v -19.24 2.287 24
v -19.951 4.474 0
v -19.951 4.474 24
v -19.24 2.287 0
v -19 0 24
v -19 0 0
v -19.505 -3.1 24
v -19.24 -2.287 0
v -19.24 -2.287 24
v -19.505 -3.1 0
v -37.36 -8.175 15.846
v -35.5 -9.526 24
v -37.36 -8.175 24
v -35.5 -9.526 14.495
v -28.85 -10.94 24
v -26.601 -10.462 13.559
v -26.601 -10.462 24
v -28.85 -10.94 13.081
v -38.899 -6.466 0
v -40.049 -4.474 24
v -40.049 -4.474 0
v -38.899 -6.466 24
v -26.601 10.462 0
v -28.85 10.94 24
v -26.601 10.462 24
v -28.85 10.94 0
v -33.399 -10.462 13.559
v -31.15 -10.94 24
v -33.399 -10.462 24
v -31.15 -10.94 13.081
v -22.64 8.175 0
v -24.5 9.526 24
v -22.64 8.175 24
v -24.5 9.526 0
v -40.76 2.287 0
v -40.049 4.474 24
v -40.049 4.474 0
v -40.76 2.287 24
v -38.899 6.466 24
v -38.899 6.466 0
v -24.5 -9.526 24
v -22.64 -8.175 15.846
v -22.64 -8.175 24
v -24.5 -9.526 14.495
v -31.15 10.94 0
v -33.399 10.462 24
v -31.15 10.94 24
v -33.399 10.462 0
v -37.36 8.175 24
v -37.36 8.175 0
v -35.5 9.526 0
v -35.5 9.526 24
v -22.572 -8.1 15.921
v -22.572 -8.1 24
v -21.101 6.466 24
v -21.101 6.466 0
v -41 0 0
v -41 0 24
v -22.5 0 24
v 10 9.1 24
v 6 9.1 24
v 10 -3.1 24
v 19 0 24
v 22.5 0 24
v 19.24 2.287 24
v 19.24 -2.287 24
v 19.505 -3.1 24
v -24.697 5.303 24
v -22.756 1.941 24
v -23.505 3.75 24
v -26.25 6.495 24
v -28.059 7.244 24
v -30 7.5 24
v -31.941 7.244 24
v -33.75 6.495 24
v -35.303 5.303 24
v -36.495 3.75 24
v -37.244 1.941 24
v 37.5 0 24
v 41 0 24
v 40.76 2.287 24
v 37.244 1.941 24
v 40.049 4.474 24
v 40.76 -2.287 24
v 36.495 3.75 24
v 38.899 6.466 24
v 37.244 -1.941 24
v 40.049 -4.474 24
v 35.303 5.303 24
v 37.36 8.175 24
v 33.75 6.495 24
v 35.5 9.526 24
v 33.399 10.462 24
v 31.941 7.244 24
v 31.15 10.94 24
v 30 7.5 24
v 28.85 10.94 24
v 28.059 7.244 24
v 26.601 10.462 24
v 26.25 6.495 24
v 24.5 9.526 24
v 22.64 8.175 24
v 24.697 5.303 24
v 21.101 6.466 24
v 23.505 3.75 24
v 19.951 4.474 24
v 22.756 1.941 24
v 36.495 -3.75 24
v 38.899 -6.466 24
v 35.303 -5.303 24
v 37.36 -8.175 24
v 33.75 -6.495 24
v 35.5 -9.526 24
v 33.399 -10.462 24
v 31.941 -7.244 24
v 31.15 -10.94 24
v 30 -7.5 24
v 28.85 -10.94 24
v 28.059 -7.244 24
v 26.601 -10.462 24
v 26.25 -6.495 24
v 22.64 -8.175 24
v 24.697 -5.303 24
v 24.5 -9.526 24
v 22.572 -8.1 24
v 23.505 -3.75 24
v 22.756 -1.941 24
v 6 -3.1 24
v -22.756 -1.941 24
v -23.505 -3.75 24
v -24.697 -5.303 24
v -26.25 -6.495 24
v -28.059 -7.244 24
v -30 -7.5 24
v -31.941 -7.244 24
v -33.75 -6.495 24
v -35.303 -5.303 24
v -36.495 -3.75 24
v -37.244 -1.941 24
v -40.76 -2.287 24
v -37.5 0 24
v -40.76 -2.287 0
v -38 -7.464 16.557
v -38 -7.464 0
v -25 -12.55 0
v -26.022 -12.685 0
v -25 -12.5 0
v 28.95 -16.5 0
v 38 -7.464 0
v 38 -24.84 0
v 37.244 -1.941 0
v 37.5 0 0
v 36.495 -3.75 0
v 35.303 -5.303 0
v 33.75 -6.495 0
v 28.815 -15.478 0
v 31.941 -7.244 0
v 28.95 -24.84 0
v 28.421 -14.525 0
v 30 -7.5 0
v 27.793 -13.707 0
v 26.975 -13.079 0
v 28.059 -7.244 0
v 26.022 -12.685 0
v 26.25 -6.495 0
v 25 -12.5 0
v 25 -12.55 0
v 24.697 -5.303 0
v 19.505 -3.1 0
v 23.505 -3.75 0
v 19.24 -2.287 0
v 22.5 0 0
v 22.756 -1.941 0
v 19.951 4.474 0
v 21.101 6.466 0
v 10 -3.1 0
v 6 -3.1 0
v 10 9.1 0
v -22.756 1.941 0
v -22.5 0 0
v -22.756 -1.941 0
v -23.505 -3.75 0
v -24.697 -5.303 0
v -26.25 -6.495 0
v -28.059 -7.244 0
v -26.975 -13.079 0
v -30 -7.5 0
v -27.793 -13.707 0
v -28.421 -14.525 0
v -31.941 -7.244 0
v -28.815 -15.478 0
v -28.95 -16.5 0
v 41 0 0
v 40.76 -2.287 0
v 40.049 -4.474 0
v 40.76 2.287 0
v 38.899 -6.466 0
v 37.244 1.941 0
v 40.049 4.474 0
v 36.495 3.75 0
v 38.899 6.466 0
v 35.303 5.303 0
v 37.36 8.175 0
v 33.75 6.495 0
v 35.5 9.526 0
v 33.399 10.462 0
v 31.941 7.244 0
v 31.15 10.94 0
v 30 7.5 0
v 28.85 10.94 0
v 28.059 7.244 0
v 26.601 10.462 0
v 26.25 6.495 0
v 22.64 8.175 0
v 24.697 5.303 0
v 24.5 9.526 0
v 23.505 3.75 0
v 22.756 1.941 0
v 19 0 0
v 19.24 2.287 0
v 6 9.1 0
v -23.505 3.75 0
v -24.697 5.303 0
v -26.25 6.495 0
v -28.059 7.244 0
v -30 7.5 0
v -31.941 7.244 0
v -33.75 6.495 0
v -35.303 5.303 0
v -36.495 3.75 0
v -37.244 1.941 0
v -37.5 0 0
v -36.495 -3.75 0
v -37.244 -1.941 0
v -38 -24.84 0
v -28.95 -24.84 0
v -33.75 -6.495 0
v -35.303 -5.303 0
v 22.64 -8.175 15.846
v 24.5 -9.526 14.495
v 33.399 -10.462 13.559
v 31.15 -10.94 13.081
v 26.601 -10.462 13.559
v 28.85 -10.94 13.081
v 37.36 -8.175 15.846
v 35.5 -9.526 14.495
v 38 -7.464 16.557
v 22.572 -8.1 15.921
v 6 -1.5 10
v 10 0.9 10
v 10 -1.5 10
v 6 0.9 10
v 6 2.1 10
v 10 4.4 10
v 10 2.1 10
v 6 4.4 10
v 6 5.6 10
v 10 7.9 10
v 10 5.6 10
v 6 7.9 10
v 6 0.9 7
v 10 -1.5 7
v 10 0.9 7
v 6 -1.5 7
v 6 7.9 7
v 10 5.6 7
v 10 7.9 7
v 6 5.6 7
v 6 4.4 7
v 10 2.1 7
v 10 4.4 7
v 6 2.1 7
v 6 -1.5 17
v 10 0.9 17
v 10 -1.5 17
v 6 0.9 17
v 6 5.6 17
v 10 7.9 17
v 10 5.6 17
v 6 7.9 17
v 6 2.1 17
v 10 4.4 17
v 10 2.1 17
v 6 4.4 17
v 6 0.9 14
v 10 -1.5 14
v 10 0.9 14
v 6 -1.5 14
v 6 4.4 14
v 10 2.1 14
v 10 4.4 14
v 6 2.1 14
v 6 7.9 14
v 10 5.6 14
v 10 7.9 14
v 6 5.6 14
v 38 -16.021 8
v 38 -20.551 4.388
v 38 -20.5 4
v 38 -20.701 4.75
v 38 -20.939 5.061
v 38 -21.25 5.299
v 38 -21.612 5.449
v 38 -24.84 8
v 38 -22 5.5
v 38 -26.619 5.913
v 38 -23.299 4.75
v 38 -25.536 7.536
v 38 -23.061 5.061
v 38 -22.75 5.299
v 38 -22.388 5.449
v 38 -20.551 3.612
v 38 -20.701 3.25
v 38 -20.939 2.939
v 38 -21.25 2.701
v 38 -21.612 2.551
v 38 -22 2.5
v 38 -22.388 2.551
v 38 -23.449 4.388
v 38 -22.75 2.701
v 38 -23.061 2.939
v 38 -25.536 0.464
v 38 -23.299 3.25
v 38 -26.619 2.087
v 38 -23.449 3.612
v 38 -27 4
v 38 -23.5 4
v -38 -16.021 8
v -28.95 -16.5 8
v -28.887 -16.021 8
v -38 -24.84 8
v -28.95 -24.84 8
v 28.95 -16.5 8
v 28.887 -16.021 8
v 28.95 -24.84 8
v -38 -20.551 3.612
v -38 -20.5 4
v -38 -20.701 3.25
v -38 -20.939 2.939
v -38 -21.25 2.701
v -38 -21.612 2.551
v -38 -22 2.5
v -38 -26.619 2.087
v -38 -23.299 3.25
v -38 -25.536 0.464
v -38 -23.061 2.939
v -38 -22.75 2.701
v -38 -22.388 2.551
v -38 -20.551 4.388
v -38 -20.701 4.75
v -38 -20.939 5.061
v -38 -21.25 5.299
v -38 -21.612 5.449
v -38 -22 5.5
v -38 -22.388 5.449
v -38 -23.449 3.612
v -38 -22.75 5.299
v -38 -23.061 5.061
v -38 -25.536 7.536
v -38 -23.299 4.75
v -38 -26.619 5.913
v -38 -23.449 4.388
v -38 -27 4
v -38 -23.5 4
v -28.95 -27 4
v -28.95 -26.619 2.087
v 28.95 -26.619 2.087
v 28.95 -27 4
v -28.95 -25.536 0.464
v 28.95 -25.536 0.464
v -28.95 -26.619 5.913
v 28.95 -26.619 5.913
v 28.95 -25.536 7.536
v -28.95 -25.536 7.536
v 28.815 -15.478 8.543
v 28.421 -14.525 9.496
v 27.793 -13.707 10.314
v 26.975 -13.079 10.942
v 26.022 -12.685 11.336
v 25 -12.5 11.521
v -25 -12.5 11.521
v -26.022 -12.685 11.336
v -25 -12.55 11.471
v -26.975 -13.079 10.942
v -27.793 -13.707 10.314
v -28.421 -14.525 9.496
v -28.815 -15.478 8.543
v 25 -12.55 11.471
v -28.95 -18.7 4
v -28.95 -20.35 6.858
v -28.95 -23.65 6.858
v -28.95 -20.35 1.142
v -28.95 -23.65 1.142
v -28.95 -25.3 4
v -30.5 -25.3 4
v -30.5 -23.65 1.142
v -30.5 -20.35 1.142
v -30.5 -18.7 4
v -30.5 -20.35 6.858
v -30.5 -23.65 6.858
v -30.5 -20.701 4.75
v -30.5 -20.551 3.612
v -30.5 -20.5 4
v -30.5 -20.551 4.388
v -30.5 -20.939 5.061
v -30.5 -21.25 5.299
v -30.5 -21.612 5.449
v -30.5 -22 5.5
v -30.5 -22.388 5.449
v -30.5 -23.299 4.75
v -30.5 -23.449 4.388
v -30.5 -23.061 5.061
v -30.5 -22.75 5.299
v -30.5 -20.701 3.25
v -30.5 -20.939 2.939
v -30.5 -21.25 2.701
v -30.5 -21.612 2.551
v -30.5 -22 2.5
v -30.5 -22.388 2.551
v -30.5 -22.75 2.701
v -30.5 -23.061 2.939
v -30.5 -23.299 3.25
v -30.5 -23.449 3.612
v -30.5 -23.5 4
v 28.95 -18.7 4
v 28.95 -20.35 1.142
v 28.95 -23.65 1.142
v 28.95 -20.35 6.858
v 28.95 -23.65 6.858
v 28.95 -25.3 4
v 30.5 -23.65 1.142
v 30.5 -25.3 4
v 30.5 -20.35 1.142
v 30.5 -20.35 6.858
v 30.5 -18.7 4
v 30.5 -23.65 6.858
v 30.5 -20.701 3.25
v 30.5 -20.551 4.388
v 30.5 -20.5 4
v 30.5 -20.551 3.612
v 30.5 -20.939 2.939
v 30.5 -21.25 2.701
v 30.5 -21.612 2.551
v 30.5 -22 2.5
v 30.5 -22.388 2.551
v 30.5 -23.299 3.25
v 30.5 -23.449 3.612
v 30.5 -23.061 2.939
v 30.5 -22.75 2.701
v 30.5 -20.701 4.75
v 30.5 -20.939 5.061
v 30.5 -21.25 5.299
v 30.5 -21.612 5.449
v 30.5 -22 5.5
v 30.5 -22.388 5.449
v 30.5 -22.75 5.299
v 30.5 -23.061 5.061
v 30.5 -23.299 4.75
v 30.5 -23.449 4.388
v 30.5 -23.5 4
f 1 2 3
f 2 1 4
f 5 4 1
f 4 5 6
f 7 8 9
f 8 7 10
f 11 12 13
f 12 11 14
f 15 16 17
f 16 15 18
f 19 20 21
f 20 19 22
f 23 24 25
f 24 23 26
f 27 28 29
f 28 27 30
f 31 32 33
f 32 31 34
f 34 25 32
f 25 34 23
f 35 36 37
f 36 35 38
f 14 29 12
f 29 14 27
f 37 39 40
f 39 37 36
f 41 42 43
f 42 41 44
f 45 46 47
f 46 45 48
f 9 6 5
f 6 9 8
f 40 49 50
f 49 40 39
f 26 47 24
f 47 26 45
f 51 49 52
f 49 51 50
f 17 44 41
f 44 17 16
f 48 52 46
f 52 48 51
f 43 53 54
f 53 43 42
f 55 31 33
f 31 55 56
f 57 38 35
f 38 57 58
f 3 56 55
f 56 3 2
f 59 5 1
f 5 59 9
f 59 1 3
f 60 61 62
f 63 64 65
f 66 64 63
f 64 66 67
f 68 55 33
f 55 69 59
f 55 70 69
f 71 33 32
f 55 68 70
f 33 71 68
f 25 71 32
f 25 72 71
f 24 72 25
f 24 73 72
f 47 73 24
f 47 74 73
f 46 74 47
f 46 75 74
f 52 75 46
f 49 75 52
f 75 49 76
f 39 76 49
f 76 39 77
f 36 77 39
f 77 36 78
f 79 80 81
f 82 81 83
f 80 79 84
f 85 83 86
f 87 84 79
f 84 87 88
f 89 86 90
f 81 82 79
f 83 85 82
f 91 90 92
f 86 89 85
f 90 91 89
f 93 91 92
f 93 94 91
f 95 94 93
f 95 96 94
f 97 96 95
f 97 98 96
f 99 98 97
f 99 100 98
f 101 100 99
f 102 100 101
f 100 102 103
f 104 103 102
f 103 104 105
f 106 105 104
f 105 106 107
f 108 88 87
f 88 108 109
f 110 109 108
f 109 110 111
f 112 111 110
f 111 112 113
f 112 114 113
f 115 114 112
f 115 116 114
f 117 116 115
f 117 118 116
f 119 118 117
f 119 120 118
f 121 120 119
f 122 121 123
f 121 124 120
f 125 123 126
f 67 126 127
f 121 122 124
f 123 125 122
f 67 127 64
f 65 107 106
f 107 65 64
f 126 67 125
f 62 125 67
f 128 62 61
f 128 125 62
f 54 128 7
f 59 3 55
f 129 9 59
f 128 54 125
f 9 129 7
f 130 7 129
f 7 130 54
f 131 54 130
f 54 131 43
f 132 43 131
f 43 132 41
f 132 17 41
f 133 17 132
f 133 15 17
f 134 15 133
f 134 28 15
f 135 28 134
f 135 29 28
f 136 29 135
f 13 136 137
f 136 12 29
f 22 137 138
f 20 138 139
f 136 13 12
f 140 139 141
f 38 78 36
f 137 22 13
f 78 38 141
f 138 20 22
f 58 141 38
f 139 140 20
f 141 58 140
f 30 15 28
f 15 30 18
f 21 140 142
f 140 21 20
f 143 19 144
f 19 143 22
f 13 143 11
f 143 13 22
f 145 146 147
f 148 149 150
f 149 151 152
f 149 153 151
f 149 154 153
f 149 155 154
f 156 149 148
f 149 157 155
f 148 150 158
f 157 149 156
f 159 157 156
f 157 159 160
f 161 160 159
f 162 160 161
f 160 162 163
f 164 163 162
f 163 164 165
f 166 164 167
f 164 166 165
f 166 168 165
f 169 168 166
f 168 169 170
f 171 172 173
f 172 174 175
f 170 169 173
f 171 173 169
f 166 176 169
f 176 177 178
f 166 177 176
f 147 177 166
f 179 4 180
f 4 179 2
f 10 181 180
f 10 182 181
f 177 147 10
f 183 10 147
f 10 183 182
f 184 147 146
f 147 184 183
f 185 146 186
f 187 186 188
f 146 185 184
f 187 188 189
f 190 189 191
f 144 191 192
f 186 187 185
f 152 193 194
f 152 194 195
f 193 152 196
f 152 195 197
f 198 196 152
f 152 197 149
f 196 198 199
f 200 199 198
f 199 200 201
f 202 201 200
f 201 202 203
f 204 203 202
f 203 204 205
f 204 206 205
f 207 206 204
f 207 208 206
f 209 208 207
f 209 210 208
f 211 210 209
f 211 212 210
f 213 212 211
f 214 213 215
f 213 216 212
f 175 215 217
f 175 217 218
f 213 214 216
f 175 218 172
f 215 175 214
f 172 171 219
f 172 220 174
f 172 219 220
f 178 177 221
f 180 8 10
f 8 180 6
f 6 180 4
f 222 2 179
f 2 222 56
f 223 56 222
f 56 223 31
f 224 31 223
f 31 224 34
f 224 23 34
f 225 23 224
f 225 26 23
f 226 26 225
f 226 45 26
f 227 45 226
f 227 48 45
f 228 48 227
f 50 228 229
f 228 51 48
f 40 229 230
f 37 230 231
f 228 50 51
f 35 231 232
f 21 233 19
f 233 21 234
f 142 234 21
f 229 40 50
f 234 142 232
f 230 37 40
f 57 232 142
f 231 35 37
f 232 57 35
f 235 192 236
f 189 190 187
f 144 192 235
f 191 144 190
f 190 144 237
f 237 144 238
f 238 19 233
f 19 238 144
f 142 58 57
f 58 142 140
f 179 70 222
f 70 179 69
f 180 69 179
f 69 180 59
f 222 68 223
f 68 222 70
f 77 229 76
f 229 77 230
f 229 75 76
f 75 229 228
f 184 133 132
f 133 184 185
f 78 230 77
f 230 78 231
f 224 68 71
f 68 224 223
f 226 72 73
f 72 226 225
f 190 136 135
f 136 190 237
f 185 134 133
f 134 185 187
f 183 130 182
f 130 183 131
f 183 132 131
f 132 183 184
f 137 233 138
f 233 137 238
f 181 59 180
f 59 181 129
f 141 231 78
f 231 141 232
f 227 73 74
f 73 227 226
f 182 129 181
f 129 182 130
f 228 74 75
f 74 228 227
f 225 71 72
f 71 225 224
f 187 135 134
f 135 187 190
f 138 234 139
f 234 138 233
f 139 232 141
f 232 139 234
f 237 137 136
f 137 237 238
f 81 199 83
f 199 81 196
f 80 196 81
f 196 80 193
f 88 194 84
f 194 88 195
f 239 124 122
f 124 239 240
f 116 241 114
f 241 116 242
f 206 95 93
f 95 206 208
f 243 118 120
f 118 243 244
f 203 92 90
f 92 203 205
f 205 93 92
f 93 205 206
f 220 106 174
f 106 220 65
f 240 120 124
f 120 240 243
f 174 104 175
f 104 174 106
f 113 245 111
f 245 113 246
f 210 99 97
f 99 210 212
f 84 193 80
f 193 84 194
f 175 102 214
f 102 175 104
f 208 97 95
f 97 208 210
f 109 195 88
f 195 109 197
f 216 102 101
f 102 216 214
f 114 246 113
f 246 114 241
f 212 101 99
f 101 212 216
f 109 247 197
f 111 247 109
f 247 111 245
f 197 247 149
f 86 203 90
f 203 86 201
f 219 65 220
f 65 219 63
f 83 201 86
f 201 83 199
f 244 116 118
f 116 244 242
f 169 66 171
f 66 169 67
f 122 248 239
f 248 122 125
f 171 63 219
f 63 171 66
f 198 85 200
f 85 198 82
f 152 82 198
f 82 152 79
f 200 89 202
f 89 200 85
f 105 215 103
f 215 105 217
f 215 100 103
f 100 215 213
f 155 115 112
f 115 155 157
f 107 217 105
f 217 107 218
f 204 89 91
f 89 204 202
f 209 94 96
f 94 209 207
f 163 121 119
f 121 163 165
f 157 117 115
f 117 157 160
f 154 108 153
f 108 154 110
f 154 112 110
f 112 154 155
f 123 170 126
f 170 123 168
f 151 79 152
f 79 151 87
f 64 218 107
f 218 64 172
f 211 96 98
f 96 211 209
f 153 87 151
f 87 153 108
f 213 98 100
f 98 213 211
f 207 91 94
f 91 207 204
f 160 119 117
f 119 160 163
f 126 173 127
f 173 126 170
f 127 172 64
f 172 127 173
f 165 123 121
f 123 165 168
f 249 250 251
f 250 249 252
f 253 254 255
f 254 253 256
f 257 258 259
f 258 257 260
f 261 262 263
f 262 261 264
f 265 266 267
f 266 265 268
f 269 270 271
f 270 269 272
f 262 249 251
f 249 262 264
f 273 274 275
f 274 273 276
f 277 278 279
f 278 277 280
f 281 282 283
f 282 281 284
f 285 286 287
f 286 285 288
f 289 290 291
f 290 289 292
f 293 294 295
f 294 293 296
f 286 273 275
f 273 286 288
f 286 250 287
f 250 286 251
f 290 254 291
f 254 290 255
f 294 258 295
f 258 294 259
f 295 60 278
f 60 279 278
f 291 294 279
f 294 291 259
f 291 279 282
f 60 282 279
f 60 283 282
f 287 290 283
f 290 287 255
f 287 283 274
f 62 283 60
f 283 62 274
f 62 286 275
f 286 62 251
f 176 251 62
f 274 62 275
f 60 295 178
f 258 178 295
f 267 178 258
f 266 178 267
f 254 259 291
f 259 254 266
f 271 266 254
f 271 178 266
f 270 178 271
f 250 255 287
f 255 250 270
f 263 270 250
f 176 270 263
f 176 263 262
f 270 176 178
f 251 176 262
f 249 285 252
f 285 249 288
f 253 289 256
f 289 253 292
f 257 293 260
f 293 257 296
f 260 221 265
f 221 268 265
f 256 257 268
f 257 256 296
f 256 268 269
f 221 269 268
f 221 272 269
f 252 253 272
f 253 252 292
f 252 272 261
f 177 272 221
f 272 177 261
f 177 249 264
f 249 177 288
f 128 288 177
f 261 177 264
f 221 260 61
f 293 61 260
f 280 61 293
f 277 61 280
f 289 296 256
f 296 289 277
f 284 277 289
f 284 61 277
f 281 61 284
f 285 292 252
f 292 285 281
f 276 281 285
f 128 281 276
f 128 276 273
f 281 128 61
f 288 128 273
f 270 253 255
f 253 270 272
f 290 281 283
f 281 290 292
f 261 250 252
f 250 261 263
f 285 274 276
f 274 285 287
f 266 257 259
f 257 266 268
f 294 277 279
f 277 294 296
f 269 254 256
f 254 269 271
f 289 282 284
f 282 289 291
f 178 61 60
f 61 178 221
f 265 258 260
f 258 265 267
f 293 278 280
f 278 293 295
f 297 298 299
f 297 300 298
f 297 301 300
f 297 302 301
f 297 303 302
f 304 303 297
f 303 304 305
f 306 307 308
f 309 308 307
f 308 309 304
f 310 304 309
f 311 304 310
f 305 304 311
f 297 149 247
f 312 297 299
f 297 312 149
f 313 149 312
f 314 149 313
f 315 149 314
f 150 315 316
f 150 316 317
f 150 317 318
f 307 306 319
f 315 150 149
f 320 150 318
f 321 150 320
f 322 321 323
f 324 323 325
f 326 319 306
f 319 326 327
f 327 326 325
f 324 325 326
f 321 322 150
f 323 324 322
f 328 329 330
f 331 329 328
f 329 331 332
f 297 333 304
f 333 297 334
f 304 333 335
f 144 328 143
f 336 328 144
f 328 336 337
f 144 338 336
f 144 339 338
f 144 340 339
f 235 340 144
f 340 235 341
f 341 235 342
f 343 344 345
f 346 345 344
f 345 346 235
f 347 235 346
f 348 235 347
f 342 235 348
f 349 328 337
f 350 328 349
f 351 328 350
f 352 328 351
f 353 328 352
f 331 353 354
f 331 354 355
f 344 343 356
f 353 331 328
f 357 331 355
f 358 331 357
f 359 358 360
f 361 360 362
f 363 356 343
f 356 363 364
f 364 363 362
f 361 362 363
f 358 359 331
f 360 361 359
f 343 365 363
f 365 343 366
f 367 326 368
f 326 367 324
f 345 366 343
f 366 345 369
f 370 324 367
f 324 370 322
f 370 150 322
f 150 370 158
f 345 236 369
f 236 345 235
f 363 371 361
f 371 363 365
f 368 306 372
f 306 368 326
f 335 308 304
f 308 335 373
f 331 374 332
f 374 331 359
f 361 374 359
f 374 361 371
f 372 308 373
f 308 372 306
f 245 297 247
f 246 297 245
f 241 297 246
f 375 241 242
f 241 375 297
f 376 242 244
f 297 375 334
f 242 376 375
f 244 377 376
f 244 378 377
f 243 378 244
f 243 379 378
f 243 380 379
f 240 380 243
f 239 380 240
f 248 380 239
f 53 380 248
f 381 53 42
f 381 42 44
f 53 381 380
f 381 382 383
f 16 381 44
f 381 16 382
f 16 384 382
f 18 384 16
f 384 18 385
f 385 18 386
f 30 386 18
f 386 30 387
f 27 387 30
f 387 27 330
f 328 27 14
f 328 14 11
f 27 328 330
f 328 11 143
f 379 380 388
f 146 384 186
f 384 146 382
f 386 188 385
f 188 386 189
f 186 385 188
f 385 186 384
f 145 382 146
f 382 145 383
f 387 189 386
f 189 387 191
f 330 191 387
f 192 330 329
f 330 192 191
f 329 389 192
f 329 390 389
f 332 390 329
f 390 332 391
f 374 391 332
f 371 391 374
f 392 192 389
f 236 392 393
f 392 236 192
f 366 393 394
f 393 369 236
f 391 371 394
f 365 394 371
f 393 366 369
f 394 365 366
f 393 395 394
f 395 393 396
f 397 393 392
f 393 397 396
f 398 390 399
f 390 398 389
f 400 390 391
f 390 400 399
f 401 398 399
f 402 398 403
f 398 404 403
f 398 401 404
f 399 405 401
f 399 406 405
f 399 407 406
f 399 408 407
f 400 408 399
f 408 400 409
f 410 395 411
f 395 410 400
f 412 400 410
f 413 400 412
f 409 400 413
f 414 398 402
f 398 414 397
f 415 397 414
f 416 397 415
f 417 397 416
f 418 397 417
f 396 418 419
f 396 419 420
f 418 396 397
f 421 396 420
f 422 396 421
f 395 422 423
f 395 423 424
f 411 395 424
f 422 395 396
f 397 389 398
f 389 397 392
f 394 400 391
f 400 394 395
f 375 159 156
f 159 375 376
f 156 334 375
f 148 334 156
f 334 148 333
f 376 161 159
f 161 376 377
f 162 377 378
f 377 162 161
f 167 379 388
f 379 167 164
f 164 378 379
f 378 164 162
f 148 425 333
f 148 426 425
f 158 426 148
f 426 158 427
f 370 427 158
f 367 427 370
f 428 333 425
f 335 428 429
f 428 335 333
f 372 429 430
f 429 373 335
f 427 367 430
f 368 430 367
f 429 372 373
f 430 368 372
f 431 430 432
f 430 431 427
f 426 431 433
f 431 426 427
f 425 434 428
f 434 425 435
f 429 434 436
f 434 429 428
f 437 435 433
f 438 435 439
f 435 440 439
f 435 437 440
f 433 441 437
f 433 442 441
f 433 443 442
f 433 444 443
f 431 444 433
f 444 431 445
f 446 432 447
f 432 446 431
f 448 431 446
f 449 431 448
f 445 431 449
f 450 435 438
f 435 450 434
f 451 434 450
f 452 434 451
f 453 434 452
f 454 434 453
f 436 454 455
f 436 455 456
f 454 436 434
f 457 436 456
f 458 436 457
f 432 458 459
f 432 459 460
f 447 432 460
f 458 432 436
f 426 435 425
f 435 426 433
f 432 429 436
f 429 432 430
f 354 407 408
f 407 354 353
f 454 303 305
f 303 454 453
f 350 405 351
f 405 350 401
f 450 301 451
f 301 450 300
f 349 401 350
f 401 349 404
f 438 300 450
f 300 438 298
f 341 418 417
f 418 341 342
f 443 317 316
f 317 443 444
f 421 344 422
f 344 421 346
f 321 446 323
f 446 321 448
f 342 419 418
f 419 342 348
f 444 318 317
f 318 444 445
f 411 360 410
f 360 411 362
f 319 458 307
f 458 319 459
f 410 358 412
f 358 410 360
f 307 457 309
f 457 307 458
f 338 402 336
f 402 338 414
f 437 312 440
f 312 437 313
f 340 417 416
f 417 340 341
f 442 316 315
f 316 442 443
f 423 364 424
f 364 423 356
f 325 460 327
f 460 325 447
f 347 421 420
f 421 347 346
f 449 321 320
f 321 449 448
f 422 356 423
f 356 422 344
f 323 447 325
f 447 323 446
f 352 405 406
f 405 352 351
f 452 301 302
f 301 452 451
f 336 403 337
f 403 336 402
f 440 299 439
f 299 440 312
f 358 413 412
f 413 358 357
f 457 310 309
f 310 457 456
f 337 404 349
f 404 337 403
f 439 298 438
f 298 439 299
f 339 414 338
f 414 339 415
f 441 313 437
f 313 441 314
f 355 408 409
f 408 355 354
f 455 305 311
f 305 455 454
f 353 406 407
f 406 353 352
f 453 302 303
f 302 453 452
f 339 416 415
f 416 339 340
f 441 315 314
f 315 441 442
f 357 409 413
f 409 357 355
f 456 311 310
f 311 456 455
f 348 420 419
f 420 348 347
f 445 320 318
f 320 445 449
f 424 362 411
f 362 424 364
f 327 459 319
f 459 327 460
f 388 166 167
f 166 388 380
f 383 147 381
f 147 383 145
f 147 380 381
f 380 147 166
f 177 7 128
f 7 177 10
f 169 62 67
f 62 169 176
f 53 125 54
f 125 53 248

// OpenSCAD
// file: configuration.scad
motor_end_height=44;
idler_end_height=40;
carriage_height=24;
platform_thickness=8;
bed_thickness=12;
pcb_thickness=2;
rod_length=120;
smooth_rod_length=300;
tower_radius = 120;
platform_hinge_offset=33;
carriage_hinge_offset=22;
// main file
include <configuration.scad>

width = 76;
height = carriage_height;

offset = 25;
cutout = 7.9;
middle = 2*offset - width/2;

module parallel_joints(reinforced) {
  difference() {
    union() {
      intersection() {
        cube([width, 20, 8], center=true);
        rotate([0, 90, 0]) cylinder(r=5, h=width, center=true);
      }
      intersection() {
        translate([0, 18, 4]) rotate([45, 0, 0])
          cube([width, reinforced, reinforced], center=true);
        translate([0, 0, 20]) cube([width, 35, 40], center=true);
      }
      translate([0, 8, 0]) cube([width, 16, 8], center=true);
    }
    // bolt hole
    rotate([0, 90, 0]) cylinder(r=1.5, h=80, center=true, $fn=24);

    for (x = [-offset, offset]) {
        //arm cut
        translate([x, 5.5, 0])
          cylinder(r=cutout/2, h=100, center=true, $fn=24);
        translate([x, -4.5, 0])
          cube([cutout, 20, 100], center=true);
        
         // nut cutout
        translate([x*1.18, 0, 0]) rotate([0, 90, 0]) rotate([0, 0, 30])
        cylinder(r=3.3, h=2, center=true, $fn=6);
       
     }
     // center cut
    //translate([0, 2, 0]) cylinder(r=middle, h=100, center=true);
    translate([0, -8, 0]) {
        cube([2*middle+26, 35, 100], center=true);
        
    }
  }
}

module lm8uu_mount(d, h) {
  union() {
    difference() {
      intersection() {
        cylinder(r=11, h=h, center=true);
        //translate([0, -8, 0]) cube([19, 13, h+1], center=true);
      }
      cylinder(r=d/2, h=h+1, center=true);
    }
  }
}

module belt_mount() {
  difference() {
    union() {
      difference() {
        translate([8, 2, 0]) cube([4, 13, height], center=true);
        for (z = [-3.5, 3.5])
          translate([8, 5, z])
            cube([5, 13, 3], center=true);
      }
      for (y = [1.5, 5, 8.5]) {
        translate([8, y, 0]) cube([4, 1.2, height], center=true);
      }
    }
  }
}

module carriage() {
  translate([0, 0, height/2]) 
  union() {
    for (x = [-30, 30]) {
      translate([x, 0, 0]) lm8uu_mount(d=15, h=24);
    }
    belt_mount();
    difference() {
      union() {
        translate([0, -5.6, 0])
          cube([50, 5, height], center=true);
        translate([0, -carriage_hinge_offset, -height/2+4])
          parallel_joints(17);
      }
      // Screw hole for adjustable top endstop.
      translate([15, -16, -height/2+4])
        cylinder(r=1.5, h=20, center=true, $fn=12);
      for (x = [-30, 30]) {
        translate([x, 0, 0])
          cylinder(r=8, h=height+1, center=true);
        // Zip tie tunnels.
        //for (z = [-height/2+4, height/2-4])
          //translate([x, 0, z])
            //cylinder(r=13, h=3, center=true);
      }
    }
  }
}

carriage();

// Uncomment the following lines to check endstop alignment.
 //use <idler_end.scad>;
// translate([0, 0, -20]) rotate([180, 0, 0]) idler_end();
